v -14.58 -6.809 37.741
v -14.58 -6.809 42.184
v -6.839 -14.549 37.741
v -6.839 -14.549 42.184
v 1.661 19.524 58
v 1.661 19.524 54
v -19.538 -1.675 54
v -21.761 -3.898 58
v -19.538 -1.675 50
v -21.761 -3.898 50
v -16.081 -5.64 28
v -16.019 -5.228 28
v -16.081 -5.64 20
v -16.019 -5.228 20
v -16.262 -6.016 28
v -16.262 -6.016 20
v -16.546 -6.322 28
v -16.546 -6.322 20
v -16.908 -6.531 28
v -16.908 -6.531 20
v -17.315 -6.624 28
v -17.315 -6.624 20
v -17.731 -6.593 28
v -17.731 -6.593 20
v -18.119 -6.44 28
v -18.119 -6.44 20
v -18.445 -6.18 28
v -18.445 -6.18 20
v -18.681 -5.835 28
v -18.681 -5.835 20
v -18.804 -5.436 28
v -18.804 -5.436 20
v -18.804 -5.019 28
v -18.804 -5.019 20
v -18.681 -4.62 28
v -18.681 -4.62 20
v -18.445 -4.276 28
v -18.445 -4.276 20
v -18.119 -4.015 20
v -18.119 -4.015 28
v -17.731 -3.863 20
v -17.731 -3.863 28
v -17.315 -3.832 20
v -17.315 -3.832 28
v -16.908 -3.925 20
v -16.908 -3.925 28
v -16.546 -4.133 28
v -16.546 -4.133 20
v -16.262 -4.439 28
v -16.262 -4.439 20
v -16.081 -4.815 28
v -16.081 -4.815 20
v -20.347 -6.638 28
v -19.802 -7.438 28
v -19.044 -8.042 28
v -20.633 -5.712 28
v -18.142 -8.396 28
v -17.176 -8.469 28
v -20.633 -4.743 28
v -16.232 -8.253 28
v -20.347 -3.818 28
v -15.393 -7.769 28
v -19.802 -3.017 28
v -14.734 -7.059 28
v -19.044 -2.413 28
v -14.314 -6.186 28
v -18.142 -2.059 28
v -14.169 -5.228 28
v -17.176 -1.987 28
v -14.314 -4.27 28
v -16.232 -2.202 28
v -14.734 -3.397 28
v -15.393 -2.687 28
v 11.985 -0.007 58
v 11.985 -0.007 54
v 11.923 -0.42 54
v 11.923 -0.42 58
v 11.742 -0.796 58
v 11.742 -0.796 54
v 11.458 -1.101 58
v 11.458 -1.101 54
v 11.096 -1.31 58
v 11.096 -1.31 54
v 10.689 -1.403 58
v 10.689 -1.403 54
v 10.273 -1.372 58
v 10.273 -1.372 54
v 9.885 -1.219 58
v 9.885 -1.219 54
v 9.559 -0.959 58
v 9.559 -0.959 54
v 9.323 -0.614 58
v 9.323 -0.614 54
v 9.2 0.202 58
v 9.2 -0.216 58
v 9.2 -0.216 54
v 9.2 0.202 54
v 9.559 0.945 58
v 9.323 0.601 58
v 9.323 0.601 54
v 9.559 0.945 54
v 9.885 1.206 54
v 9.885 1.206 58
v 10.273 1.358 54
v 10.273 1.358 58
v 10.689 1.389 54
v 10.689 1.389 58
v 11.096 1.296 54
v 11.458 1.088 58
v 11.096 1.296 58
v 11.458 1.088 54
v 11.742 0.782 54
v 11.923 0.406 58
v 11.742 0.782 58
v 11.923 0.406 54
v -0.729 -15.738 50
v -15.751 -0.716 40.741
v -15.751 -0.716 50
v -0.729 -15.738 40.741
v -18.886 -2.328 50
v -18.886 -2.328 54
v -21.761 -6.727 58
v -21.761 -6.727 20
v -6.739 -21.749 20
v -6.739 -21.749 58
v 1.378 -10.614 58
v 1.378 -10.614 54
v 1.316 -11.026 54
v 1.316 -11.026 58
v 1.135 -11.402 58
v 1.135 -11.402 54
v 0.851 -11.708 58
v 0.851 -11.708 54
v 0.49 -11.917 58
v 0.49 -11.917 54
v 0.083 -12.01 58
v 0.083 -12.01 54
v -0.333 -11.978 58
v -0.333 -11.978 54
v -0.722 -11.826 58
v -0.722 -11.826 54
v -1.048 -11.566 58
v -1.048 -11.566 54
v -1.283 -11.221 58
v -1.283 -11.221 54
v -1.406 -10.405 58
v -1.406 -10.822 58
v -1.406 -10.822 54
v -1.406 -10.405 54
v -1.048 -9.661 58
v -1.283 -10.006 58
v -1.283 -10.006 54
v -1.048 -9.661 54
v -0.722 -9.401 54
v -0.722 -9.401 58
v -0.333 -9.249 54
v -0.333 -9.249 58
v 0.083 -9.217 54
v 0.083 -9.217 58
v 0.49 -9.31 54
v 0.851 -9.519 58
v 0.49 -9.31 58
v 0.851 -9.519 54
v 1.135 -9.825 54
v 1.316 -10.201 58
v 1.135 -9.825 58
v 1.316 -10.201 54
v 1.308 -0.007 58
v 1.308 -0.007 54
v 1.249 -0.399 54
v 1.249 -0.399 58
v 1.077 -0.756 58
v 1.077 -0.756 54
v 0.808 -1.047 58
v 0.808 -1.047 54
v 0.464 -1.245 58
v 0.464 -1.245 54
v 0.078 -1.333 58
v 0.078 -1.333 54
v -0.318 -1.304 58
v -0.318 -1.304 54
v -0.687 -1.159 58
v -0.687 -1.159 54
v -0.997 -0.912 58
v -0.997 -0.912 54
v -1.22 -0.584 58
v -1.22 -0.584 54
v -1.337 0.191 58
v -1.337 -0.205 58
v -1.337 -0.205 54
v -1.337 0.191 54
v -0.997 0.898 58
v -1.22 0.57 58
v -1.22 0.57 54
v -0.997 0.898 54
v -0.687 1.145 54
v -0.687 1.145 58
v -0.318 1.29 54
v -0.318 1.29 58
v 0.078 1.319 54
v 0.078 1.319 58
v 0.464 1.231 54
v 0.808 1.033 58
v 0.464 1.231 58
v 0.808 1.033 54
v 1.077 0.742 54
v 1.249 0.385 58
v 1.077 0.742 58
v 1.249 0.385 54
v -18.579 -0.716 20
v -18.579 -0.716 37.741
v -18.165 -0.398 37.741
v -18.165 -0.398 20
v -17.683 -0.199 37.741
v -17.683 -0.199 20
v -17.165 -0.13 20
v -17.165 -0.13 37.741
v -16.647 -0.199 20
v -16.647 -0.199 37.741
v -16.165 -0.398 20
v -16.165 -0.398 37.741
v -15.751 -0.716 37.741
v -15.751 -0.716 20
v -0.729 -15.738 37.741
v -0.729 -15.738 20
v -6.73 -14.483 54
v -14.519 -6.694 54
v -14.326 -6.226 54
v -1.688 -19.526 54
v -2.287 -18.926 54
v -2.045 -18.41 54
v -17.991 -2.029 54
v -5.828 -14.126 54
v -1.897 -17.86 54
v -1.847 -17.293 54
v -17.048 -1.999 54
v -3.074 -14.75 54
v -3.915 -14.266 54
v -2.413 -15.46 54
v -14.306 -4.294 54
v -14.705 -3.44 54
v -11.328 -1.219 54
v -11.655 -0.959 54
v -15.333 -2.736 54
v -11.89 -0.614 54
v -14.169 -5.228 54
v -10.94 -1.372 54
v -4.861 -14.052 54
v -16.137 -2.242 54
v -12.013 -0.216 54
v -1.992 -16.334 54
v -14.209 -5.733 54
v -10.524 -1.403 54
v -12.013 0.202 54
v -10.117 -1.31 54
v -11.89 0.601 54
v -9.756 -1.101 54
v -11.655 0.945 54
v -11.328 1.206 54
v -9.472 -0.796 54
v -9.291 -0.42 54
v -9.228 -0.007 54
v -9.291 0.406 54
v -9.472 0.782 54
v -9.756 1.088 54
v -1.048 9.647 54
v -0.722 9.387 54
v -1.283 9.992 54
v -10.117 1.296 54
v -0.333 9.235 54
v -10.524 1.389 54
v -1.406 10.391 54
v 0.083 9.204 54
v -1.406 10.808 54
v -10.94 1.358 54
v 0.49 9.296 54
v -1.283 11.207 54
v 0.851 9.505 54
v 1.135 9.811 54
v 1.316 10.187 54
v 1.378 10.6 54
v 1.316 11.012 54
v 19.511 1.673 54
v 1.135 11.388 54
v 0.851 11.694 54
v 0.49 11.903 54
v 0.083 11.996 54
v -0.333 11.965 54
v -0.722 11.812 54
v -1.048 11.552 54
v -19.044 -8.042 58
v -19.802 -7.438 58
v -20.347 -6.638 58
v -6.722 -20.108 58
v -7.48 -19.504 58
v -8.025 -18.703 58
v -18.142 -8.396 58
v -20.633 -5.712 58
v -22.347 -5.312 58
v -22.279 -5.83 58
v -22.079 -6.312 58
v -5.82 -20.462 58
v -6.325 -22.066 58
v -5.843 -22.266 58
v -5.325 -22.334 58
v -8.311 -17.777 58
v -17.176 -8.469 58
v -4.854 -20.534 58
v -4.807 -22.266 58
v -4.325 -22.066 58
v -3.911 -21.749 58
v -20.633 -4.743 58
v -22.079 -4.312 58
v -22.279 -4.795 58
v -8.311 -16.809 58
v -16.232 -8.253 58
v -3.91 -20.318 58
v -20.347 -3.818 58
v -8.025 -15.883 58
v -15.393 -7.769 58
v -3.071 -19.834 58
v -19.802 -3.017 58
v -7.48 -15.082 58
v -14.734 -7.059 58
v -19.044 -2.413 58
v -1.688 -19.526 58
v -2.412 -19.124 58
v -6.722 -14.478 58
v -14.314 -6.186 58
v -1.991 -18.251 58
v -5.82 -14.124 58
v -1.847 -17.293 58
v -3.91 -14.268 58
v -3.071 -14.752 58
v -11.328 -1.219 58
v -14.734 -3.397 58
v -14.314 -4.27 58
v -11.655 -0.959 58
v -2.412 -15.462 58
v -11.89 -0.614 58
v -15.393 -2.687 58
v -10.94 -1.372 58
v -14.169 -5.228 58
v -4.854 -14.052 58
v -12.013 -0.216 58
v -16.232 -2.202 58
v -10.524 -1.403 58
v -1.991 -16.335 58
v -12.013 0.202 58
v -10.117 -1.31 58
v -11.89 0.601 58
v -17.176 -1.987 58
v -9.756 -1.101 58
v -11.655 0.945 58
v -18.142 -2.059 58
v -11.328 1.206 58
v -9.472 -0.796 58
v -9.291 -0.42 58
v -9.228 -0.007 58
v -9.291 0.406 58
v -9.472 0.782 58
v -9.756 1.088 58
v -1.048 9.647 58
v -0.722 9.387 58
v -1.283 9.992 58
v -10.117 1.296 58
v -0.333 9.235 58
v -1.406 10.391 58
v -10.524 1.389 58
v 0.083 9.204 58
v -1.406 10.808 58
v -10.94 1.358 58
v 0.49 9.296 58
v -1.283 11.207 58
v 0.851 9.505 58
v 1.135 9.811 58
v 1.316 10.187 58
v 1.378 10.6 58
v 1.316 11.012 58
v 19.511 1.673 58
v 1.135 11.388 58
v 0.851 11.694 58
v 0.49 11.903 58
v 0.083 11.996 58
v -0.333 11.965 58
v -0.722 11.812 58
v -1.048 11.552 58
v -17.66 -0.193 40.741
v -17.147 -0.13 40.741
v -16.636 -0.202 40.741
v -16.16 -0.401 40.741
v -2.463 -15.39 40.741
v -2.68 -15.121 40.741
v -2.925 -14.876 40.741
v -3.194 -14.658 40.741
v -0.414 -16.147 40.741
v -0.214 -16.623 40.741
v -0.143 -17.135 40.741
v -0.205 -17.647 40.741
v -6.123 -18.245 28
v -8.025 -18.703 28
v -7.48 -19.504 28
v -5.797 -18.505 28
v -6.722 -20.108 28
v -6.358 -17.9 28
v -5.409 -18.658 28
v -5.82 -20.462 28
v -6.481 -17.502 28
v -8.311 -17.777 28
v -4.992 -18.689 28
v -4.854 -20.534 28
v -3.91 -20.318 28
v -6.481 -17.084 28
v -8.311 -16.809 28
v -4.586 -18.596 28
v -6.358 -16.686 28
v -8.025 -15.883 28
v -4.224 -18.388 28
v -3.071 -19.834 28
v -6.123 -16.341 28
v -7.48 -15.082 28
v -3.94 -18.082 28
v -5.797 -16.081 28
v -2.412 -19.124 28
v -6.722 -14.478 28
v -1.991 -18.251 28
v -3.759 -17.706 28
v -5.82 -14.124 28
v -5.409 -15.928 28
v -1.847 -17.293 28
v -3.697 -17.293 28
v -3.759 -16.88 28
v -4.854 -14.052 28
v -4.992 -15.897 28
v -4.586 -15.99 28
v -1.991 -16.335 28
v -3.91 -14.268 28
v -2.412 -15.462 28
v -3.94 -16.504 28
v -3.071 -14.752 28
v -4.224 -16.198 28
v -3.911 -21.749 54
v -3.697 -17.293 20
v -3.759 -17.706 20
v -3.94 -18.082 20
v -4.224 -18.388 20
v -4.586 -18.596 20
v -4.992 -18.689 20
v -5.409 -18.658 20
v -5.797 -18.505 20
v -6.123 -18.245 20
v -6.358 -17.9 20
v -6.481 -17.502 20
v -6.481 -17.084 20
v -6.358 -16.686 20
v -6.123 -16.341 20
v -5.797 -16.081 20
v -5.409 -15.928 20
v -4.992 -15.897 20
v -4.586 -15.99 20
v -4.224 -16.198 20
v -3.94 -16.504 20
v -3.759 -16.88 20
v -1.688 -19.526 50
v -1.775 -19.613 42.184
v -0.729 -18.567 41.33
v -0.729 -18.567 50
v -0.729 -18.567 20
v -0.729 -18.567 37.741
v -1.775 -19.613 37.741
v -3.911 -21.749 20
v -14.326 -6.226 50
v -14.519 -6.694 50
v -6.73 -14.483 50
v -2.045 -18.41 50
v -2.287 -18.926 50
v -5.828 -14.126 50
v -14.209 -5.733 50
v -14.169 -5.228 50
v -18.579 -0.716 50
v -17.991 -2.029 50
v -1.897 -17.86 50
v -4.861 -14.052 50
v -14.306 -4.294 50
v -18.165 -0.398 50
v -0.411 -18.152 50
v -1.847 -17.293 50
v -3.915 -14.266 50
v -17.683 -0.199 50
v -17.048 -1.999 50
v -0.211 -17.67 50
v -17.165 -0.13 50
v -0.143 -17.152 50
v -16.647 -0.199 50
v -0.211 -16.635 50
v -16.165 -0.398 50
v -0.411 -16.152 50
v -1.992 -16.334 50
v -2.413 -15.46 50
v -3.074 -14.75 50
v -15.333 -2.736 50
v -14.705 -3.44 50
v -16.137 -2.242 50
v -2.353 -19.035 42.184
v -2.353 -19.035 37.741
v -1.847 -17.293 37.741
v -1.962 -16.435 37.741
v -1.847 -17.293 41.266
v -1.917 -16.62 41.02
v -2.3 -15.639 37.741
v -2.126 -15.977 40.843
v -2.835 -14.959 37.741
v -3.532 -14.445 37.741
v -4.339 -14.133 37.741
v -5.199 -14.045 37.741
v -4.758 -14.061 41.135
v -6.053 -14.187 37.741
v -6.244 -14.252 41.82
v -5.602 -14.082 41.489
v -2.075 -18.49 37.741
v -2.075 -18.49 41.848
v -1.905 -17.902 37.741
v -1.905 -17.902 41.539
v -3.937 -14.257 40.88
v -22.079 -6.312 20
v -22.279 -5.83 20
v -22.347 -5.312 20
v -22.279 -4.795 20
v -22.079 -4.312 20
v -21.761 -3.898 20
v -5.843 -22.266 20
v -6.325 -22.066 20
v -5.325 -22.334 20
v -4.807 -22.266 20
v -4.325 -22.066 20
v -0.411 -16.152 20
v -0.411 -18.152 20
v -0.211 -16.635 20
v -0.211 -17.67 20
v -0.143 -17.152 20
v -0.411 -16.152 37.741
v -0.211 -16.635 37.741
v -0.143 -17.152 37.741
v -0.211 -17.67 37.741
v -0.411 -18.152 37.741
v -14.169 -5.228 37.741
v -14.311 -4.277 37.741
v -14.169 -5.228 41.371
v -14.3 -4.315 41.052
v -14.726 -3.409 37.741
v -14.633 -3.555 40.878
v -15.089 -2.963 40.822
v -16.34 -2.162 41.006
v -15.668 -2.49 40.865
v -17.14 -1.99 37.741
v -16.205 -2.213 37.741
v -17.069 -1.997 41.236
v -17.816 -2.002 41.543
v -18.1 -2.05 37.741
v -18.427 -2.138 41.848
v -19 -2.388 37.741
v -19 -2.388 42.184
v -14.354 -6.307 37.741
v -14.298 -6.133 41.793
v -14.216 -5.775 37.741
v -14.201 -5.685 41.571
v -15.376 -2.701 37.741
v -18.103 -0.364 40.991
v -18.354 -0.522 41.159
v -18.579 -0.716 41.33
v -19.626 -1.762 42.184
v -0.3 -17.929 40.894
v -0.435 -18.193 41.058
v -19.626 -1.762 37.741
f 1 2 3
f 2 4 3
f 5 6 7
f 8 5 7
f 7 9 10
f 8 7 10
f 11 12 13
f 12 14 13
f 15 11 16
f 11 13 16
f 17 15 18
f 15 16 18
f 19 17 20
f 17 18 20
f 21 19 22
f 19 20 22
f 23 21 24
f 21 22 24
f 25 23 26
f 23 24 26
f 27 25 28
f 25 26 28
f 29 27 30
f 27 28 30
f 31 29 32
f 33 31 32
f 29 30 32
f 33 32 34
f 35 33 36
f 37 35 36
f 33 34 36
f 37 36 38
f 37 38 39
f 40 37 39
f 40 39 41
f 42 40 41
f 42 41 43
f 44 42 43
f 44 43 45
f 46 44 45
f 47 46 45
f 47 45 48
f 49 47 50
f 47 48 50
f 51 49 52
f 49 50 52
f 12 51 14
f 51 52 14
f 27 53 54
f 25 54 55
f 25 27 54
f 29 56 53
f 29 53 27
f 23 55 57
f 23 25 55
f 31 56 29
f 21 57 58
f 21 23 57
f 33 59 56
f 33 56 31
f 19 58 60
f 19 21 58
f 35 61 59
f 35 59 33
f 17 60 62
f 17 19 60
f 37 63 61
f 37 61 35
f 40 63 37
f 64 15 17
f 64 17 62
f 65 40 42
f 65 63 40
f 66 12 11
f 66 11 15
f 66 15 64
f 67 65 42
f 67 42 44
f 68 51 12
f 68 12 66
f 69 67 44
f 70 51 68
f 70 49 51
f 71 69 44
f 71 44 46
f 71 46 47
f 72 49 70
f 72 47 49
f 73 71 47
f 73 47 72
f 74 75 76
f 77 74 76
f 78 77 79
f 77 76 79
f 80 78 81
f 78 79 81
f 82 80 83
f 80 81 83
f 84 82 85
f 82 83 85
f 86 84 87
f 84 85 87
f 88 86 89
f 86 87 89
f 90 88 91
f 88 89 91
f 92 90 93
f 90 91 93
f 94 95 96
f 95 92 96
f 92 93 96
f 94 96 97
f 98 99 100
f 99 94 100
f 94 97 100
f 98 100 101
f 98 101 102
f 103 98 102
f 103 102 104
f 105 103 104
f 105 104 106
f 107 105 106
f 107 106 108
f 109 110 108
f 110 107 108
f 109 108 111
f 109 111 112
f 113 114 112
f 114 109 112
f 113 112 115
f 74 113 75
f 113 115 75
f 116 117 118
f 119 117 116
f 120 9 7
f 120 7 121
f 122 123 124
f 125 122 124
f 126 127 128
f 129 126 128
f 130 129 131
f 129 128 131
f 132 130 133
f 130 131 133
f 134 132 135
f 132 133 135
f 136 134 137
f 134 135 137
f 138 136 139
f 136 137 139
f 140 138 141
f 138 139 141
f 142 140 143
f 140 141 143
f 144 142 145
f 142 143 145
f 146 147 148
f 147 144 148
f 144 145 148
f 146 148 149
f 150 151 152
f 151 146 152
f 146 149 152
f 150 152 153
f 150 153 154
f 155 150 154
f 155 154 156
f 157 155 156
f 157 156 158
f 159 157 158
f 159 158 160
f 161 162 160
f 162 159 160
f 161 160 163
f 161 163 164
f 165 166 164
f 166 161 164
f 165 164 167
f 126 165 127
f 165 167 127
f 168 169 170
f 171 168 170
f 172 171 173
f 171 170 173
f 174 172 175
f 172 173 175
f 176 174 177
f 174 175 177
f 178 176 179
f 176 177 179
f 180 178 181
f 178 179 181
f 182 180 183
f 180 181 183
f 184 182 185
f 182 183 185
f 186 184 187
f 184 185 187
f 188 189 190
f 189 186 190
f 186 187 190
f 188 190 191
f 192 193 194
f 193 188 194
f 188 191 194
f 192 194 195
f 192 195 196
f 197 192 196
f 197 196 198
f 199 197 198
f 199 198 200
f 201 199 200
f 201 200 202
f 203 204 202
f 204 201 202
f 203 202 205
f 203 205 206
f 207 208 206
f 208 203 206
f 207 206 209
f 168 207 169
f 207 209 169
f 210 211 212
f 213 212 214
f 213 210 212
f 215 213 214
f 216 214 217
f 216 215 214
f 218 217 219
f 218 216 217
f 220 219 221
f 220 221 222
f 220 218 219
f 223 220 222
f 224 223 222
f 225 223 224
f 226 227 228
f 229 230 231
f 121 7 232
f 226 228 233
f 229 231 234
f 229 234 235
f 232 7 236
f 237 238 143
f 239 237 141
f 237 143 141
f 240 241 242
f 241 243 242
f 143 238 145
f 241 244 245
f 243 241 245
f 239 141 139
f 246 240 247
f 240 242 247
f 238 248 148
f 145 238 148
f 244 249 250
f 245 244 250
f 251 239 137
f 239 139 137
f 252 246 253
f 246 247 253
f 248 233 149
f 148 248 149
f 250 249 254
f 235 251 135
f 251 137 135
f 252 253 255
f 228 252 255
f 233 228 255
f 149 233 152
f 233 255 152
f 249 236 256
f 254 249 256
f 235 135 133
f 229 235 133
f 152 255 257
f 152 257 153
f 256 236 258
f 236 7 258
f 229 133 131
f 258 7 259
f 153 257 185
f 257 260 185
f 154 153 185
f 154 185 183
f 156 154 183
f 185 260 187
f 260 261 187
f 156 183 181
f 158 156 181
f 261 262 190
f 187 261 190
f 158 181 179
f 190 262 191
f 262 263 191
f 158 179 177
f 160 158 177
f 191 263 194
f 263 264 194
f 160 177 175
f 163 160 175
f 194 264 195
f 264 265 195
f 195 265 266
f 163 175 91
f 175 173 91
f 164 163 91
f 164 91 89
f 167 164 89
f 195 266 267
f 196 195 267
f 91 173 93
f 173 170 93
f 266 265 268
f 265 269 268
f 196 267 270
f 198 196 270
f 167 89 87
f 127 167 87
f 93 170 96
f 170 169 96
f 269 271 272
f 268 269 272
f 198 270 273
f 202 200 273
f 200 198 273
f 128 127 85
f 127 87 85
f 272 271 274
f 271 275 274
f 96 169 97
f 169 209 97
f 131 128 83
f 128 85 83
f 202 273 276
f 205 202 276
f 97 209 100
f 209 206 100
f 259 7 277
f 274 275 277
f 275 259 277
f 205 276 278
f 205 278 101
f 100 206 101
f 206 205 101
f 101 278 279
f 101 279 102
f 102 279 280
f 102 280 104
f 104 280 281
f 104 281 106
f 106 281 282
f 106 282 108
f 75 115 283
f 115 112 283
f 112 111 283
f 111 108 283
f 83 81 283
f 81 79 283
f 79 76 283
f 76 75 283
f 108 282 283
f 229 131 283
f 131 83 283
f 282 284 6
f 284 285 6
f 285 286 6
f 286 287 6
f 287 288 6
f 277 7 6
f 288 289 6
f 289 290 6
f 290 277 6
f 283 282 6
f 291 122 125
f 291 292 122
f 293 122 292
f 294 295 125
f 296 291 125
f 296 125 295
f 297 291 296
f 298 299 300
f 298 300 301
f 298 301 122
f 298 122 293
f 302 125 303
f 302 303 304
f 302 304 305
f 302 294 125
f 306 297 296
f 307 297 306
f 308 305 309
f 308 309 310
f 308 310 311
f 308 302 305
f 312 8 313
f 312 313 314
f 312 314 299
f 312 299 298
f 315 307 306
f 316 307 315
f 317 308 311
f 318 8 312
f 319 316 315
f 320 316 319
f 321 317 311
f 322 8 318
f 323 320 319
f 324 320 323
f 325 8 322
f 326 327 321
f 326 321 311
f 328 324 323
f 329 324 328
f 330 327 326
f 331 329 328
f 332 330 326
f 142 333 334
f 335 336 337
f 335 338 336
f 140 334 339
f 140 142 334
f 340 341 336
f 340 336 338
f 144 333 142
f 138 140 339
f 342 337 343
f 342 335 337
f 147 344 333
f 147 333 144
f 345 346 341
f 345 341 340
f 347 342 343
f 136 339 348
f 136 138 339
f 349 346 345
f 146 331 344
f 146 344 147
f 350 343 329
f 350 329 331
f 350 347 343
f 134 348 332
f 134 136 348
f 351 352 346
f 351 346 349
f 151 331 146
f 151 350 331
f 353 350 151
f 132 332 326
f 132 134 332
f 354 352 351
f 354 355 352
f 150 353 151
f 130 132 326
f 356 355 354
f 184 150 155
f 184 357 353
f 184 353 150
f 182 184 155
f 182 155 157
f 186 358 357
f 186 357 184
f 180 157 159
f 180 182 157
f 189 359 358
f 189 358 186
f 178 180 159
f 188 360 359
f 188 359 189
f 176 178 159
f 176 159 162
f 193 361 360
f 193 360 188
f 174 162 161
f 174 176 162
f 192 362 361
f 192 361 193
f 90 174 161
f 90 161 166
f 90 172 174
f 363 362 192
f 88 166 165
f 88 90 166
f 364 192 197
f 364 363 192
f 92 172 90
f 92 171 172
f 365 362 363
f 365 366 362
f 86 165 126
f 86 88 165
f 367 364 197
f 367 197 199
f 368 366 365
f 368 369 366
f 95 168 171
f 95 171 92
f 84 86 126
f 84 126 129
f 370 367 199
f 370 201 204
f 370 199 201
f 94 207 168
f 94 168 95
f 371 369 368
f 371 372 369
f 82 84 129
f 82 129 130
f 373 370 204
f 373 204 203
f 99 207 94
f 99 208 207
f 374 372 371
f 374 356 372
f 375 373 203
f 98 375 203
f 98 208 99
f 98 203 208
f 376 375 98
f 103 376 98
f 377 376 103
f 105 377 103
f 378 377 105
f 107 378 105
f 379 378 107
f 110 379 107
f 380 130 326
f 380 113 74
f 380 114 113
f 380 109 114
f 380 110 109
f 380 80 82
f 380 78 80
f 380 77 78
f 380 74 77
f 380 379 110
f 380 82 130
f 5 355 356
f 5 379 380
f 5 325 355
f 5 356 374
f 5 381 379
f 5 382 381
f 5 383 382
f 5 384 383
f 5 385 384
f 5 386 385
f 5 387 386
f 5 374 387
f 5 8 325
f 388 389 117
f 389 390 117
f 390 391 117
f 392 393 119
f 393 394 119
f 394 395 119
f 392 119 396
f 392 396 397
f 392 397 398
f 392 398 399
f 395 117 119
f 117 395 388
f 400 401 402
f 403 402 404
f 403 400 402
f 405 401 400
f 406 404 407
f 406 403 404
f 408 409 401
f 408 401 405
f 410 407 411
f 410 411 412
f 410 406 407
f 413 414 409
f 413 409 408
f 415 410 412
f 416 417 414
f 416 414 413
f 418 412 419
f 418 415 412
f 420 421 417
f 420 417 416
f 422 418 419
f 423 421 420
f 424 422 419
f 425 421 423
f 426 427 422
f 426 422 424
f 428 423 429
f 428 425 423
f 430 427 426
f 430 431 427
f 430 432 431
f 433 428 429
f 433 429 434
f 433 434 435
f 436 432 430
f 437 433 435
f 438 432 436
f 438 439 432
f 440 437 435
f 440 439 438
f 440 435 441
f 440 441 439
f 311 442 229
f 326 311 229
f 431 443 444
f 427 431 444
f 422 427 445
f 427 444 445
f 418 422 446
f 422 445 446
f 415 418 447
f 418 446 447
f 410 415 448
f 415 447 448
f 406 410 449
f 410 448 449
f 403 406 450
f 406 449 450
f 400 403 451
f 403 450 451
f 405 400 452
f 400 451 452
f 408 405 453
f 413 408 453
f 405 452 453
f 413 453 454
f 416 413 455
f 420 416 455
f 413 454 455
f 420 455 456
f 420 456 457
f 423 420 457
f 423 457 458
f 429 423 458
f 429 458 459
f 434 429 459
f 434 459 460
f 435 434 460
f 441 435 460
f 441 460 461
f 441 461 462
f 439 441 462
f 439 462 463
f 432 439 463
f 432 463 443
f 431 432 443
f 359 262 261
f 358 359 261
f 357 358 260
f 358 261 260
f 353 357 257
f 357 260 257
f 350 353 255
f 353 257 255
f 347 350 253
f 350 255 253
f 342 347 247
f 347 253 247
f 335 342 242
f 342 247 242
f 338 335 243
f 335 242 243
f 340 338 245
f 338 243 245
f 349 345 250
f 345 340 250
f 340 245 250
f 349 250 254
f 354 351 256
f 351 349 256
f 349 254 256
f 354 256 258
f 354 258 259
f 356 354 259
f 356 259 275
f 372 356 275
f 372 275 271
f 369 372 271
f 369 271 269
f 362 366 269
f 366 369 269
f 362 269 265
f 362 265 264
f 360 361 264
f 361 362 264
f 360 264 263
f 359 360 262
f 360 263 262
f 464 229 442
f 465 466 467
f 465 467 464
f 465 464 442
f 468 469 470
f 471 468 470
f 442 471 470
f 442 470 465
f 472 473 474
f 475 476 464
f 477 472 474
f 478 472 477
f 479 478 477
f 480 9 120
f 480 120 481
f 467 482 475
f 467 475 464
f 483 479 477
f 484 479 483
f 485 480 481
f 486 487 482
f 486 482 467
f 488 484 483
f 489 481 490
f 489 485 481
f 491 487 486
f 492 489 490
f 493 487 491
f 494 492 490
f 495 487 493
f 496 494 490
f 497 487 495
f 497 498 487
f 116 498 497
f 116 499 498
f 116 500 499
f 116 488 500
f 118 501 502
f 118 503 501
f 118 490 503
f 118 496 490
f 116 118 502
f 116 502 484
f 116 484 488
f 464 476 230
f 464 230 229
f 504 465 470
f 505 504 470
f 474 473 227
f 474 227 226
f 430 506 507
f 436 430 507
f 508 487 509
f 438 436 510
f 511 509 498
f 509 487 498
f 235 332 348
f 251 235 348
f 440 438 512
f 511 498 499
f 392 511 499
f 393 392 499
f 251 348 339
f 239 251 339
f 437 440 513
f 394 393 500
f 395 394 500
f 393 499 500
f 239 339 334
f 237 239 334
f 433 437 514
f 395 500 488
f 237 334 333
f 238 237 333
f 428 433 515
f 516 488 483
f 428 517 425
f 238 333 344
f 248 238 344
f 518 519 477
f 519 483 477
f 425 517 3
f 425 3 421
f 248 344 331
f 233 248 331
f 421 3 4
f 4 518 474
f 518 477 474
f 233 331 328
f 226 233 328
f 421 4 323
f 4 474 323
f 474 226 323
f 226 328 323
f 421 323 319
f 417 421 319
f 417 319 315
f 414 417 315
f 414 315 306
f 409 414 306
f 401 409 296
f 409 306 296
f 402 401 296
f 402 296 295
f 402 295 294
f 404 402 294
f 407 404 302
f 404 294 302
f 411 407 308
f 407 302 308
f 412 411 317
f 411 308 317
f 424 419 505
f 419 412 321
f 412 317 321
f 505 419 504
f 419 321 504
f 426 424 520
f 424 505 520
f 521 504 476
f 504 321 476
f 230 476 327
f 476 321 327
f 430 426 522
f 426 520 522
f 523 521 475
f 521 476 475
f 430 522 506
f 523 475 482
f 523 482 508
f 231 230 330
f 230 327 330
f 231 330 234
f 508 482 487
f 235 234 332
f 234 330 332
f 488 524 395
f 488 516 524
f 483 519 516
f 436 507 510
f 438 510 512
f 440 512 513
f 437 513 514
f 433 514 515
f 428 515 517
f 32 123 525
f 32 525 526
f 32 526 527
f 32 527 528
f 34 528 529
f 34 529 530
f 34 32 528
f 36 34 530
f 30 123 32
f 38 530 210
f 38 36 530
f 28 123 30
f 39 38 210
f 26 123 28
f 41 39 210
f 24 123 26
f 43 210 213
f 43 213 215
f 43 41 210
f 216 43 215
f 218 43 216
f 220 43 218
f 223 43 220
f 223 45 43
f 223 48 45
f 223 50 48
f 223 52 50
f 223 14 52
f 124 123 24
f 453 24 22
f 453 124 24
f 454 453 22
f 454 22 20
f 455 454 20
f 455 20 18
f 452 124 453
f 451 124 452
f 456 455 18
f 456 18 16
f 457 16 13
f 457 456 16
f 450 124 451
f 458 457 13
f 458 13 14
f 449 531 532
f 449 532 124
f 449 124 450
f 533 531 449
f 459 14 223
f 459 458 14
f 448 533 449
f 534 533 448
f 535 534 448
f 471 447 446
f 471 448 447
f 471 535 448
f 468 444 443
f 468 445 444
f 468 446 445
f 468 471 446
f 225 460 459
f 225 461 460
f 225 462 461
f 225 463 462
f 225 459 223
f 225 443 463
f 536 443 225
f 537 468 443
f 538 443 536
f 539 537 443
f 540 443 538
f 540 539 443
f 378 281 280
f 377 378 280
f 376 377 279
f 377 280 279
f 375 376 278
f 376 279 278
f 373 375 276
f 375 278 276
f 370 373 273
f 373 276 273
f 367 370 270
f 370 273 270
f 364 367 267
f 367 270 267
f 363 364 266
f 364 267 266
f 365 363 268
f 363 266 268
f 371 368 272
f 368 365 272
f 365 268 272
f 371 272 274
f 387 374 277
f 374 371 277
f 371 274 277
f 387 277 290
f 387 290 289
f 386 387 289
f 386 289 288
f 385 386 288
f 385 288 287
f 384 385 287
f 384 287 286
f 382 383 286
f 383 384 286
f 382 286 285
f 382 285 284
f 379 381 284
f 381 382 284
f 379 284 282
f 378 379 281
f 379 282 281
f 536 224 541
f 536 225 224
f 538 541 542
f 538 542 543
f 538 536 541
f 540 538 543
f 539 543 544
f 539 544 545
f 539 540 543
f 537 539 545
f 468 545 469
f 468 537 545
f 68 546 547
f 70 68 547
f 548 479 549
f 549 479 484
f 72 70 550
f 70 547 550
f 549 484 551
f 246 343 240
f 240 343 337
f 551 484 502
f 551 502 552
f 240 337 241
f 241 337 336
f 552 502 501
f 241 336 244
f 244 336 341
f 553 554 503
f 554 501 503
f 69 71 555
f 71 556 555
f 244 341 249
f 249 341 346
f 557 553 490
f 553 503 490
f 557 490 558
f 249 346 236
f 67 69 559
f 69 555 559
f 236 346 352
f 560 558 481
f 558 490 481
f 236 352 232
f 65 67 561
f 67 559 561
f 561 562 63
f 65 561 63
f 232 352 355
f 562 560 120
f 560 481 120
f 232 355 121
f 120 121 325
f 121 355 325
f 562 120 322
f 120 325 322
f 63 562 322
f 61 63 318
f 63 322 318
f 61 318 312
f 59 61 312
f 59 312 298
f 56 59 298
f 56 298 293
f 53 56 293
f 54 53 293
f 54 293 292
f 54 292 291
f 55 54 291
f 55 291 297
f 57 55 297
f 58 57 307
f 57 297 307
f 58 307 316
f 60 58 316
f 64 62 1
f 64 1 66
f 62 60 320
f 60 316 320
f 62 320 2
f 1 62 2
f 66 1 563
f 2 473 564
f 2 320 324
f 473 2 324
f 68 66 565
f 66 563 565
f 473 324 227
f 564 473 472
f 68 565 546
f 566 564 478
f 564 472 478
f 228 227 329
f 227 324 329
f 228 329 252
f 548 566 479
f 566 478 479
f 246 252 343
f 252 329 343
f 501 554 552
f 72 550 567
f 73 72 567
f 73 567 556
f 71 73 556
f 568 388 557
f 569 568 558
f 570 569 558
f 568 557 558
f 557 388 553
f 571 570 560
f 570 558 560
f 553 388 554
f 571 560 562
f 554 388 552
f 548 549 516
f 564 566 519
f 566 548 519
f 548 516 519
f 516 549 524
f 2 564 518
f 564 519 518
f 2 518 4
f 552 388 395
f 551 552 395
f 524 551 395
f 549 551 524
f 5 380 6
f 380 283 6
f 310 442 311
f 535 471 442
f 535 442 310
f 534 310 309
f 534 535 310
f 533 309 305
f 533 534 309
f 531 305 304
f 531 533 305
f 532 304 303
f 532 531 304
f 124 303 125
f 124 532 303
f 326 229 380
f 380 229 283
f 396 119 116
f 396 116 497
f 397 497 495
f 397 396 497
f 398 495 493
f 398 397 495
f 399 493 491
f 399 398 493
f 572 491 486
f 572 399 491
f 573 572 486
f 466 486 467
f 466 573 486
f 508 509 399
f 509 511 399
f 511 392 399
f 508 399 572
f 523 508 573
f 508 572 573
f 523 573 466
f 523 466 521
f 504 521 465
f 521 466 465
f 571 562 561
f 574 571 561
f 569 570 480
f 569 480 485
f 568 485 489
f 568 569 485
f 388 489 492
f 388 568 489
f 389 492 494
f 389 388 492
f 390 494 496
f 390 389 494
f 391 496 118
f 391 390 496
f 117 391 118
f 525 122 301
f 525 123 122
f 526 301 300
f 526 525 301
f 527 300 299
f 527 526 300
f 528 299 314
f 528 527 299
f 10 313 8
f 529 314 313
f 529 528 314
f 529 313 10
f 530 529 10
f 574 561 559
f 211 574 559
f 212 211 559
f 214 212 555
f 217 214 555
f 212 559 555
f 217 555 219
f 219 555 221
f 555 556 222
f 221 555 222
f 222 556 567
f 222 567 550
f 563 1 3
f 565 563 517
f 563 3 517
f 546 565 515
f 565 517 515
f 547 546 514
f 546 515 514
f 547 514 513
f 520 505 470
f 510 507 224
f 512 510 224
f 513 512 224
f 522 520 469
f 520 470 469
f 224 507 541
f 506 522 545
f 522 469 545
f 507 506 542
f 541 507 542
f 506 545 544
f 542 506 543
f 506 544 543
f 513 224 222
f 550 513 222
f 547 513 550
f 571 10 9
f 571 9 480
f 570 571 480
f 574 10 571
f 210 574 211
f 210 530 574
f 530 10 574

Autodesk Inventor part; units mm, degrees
ref_plane "YZ Plane" through (0, 0, 0) normal (1, 0, 0) x (0, 1, 0)
ref_plane "XZ Plane" through (0, 0, 0) normal (0, 1, 0) x (-1, 0, 0)
ref_plane "XY Plane" through (0, 0, 0) normal (0, 0, 1) x (1, 0, 0)
ref_plane "Arbeitsebene1" through (-0.0218, -0.0069, 0) normal (0, 0, 1) x (1, 0, 0)
sketch "Skizze1" plane through (-0.0218, -0.0069, 0) normal (0, 0, 1) x (1, 0, 0)
  circle A0 centre (-5.0753, -17.2861) radius 1.4
  circle A1 centre (-17.3974, -5.2209) radius 1.4
  arc A2 (5.7175, 26.2743) -> (7.9904, 25.6763) centre (6.0829, 23.0449) ccw
  arc A3 (5.7175, 26.2743) -> (-18.7943, -19.1862) centre (0.0218, 0.0069) ccw
  arc A4 (-18.1485, -19.7987) -> (-18.7943, -19.1862) centre (-16.256, -17.1565) ccw
  arc A5 (-18.1485, -19.7987) -> (25.9771, 6.988) centre (0.0218, 0.0069) ccw
  arc A6 (25.268, 9.2287) -> (25.9771, 6.988) centre (22.7337, 7.1941) ccw
  arc A7 (25.268, 9.2287) -> (7.9904, 25.6763) centre (0.0218, 0.0069) ccw
  spline S0 degree 3 poles (-11.5335, -6.2903) (-11.3493, -6.4745) (-11.2029, -6.6929) (-11.002, -7.1734) (-10.9495, -7.431) (-10.9461, -7.9517) (-10.9953, -8.2099) (-11.1865, -8.6846) (-11.3236, -8.8981) (-11.4967, -9.0805) knots 0 0 0 0 0.252225 0.252225 0.504373 0.504373 0.756494 0.756494 1 1 1 1
  line L0 (-11.5335, -6.2903) -> (-16.328, -1.4959)
  arc A8 (-16.328, 1.5053) -> (-16.328, -1.4959) centre (-14.8274, 0.0047) ccw
  line L1 (-16.328, 1.5053) -> (-1.4787, 16.3546)
  arc A9 (1.5225, 16.3546) -> (-1.4787, 16.3546) centre (0.0219, 14.854) ccw
  line L2 (1.5225, 16.3546) -> (16.3717, 1.5053)
  arc A10 (16.3717, -1.4959) -> (16.3717, 1.5053) centre (14.8711, 0.0047) ccw
  line L3 (16.3717, -1.4959) -> (1.5225, -16.3451)
  arc A11 (-1.4787, -16.3451) -> (1.5225, -16.3451) centre (0.0219, -14.8445) ccw
  line L4 (-1.4787, -16.3451) -> (-4.7731, -13.0507)
  spline S1 degree 3 poles (-7.5633, -13.0139) (-7.3743, -12.8347) (-7.1521, -12.694) (-6.6664, -12.5059) (-6.4076, -12.4602) (-5.8869, -12.4706) (-5.6301, -12.5266) (-5.1606, -12.7303) (-4.9509, -12.873) (-4.7731, -13.0507) knots 0 0 0 0 0.252231 0.252231 0.504388 0.504388 0.756517 0.756517 1 1 1 1
  arc A12 (-11.4967, -9.0805) -> (-7.5633, -13.0139) centre (-9.478, -10.9953) ccw
  line L5 (-17.3974, -5.2209) -> (-5.0753, -17.2861)
  line L6 (-17.8503, -0.0022) -> (0.0001, -17.8526)
  line L7 (0.0001, -17.8526) -> (-3.889, -21.7417)
  line L8 (-6.7174, -21.7417) -> (-21.7394, -6.7197)
  line L9 (-21.7394, -3.8912) -> (-17.8503, -0.0022)
  arc A13 (-21.7394, -3.8912) -> (-21.7394, -6.7197) centre (-20.3252, -5.3055) ccw
  arc A14 (-6.7174, -21.7417) -> (-3.889, -21.7417) centre (-5.3032, -20.3275) ccw
  line L10 (-17.8503, -0.0022) -> (-18.5575, -0.7093)
  line L11 (-15.729, -0.7093) -> (-0.707, -15.7313)
  line L12 (-0.707, -18.5597) -> (0.0001, -17.8526)
  line L13 (0.0001, -17.8526) -> (-17.8503, -0.0022)
  arc A15 (-15.729, -0.7093) -> (-18.5575, -0.7093) centre (-17.1432, -2.1235) ccw
  arc A16 (-0.707, -18.5597) -> (-0.707, -15.7313) centre (-2.1212, -17.1455) ccw
  circle A17 centre (5.2496, -17.4123) radius 1.4
  circle A18 centre (17.3147, -5.0902) radius 1.4
  point P0 (0.0218, 0.0069)
  point P1 (-5.3032, -23.1559)
  point P2 (-11.5553, -6.2972)
  point P3 (-16.3497, -1.5028)
  point P4 (-1.5005, -16.352)
  point P5 (-4.7949, -13.0576)
  point P6 (-17.1432, 0.705)
  dimension "d0" = 7.5
  dimension "d1" = 2
  dimension "d23" = 1
  dimension "d24" = 2
extrude "Extrusion1" add sketch "Skizze1" along normal blind 50 contours L0 A8 A15 L11 A16 A11 L4 S1 L6 S0 | S0 L6 A15 A8 L0 | L6 S1 A12 L5 S0 | S0 A12 S1 L6 A16 L7 A14 L8 A13 L9 A15 | S1 L4 A11 A16 L6 | L5 A12
sketch "Skizze2" plane through (-0.0218, -0.0069, 50) normal (0, 0, 1) x (1, 0, 0)
  line L0 (-21.1915, 0.0069) -> (0.0218, -21.2063) projected
  line L1 (-18.5575, -0.7093) -> (-21.7394, -3.8912) projected
  arc A0 (-21.7394, -3.8912) -> (-21.7394, -6.7197) centre (-20.3252, -5.3055) ccw projected
  line L2 (-21.7394, -6.7197) -> (-6.7174, -21.7417) projected
  arc A1 (-6.7174, -21.7417) -> (-3.889, -21.7417) centre (-5.3032, -20.3275) ccw projected
  line L3 (-3.889, -21.7417) -> (-0.707, -18.5597) projected
  circle A2 centre (-17.3974, -5.2209) radius 1.4 projected
  circle A3 centre (-5.0753, -17.2861) radius 1.4 projected
  arc A4 (-0.707, -18.5597) -> (-0.707, -15.7313) centre (-2.1212, -17.1455) ccw projected
  line L4 (-0.707, -15.7313) -> (-15.729, -0.7093) projected
  arc A5 (-15.729, -0.7093) -> (-18.5575, -0.7093) centre (-17.1432, -2.1235) ccw projected
  point P0 (0.0218, 0.0069)
  point P1 (-1.6659, -19.5187)
  point P2 (-3.6908, -17.4938)
  point P3 (-5.283, -15.9016)
  point P4 (-15.9978, -5.1867)
  point P5 (-17.3632, -3.8213)
  point P6 (-19.5164, -1.6682)
extrude "Extrusion2" add sketch "Skizze2" along normal blind 4 contours L0 A2 A3 L3 A1 L2 A0 L1
sketch "Skizze3" plane through (-0.0218, -0.0069, 54) normal (0, 0, 1) x (1, 0, 0)
  line L0 (21.2132, 0) -> (0, 21.2132) projected
  line L1 (0, 21.2132) -> (-21.2132, 0) projected
  line L2 (-21.2132, 0) -> (0, -21.2132) projected
  line L3 (0, -21.2132) -> (21.2132, 0) projected
  circle A0 centre (0, 0) radius 1.3301 projected
  circle A1 centre (-10.6066, 0) radius 1.5 projected
  circle A2 centre (0, -10.6066) radius 1.5 projected
  circle A3 centre (10.6066, 0) radius 1.5 projected
  circle A4 centre (0, 10.6066) radius 1.5 projected
  line L4 (-3.889, -21.7417) -> (-1.6659, -19.5187) projected
  line L5 (-1.6659, -19.5187) -> (-3.6908, -17.4938) projected
  arc A5 (-5.283, -15.9016) -> (-3.6908, -17.4938) centre (-5.0753, -17.2861) ccw projected
  line L6 (-5.283, -15.9016) -> (-15.9978, -5.1867) projected
  arc A6 (-17.3632, -3.8213) -> (-15.9978, -5.1867) centre (-17.3974, -5.2209) ccw projected
  line L7 (-17.3632, -3.8213) -> (-19.5164, -1.6682) projected
  line L8 (-19.5164, -1.6682) -> (-21.7394, -3.8912) projected
  arc A7 (-21.7394, -3.8912) -> (-21.7394, -6.7197) centre (-20.3252, -5.3055) ccw projected
  line L9 (-21.7394, -6.7197) -> (-6.7174, -21.7417) projected
  arc A8 (-6.7174, -21.7417) -> (-3.889, -21.7417) centre (-5.3032, -20.3275) ccw projected
  arc A9 (-15.9978, -5.1867) -> (-17.3632, -3.8213) centre (-17.3974, -5.2209) ccw projected
  arc A10 (-3.6908, -17.4938) -> (-5.283, -15.9016) centre (-5.0753, -17.2861) ccw projected
  circle A11 centre (-10.6066, 0) radius 1.4
  circle A12 centre (0, 10.6066) radius 1.4
  circle A13 centre (10.6066, 0) radius 1.4
  circle A14 centre (0, -10.6066) radius 1.4
  line L10 (-19.5164, -1.6682) -> (1.6825, 19.5307)
  line L11 (-1.6659, -19.5187) -> (19.533, 1.6802)
  point P0 (0.0218, 0.0069)
  point P1 (-19.5307, -1.6825)
  point P2 (-1.6802, -19.533)
  dimension "d14" = 2.8
  dimension "d15" = 2.8
  dimension "d16" = 2.8
  dimension "d17" = 2.8
extrude "Extrusion3" add sketch "Skizze3" along normal blind 4 contours L11 L5 A10 L6 A9 L7 L10 L0 | L4 L2 A5 L5 | L4 A8 L9 A7 L8 L2 A6 A5 | L7 A6 L2 L8 | A5 L2 A6 L6 | A1 | A2 | A3 | A4
sketch "Skizze4" plane through (-0.0073, -17.8452, 50) normal (0.7071068, -0.7071068, 0) x (-0.7071068, -0.7071068, 0)
  line L0 (5.5202, 50) -> (1.0202, 50) projected
  line L1 (2.3764, 0) -> (1.0202, 0) projected
  line L2 (2.3764, 0) -> (2.3764, -4) projected
  line L3 (5.5202, -8) -> (-27.6034, -8) projected
  line L4 (5.5202, 50) -> (5.5202, -8) projected
  line L5 (-2.5, 9.2593) -> (2.5, 9.2593)
  line L6 (2.5, 9.2593) -> (2.5, 12.2593)
  line L7 (2.5, 12.2593) -> (-2.5, 12.2593)
  line L8 (-2.5, 12.2593) -> (-2.5, 9.2593)
  line L9 (-2.5, 9.2593) -> (2.5, 12.2593) construction
  line L10 (2.5, 9.2593) -> (-2.5, 12.2593) construction
  line L11 (0, 9.2593) -> (2.5, 7.8159)
  line L12 (0, 9.2593) -> (2.8868, 9.2593) construction
  line L13 (2.5, 7.8159) -> (2.5, 13.7027)
  line L14 (2.5, 13.7027) -> (0, 12.2593)
  line L15 (2.3764, -4) -> (-27.6034, -4) projected
  line L16 (-27.6034, -4) -> (-27.6034, -8) projected
  line L17 (1.0202, 50) -> (1.0202, 0) projected
  point P0 (-12.6236, 50)
  point P1 (0, 10.7593)
  point P2 (2.5, 9.2593)
  dimension "d8" = 5
  dimension "d9" = 3
  dimension "d10" = 30
  dimension "d11" = 30
extrude "Extrusion4" cut sketch "Skizze4" against normal through all contours L7 L17 L5 L8 | L7 L6 L5 L17 | L17 L11 L5 | L5 L13 L11 L17
sketch "Skizze5" plane through (-0.0218, -0.0069, 58) normal (0, 0, 1) x (1, 0, 0)
  circle A0 centre (-17.3974, -5.2209) radius 1.4 projected
  circle A1 centre (-5.0753, -17.2861) radius 1.4 projected
  circle A2 centre (-17.3974, -5.2209) radius 3.25
  circle A3 centre (-5.0753, -17.2861) radius 3.25
  point P0 (0.0218, 0.0069)
  dimension "d19" = 6.5
  dimension "d20" = 6.5
extrude "Extrusion5" cut sketch "Skizze5" against normal blind 30 contours A0 | A1 | A2 | A3
sketch "Skizze6" plane through (-3.9107, -21.7486, 58) normal (0.7071068, -0.7071068, 0) x (-0.7071068, -0.7071068, 0)
  line L0 (0.9383, 30) -> (-5.5617, 30) projected
  line L1 (-14.2171, 61.056) -> (6.1145, 61.056)
  line L2 (6.1145, 61.056) -> (6.1145, 38)
  line L3 (6.1145, 38) -> (-14.2171, 38)
  line L4 (-14.2171, 38) -> (-14.2171, 61.056)
  line L5 (0, 58) -> (-4.5, 58) projected
  point P0 (-18.1439, 58)
  dimension "d25" = 20
extrude "Extrusion6" cut sketch "Skizze6" against normal blind 50
properties part number "IM_ledmatrix_holder"
